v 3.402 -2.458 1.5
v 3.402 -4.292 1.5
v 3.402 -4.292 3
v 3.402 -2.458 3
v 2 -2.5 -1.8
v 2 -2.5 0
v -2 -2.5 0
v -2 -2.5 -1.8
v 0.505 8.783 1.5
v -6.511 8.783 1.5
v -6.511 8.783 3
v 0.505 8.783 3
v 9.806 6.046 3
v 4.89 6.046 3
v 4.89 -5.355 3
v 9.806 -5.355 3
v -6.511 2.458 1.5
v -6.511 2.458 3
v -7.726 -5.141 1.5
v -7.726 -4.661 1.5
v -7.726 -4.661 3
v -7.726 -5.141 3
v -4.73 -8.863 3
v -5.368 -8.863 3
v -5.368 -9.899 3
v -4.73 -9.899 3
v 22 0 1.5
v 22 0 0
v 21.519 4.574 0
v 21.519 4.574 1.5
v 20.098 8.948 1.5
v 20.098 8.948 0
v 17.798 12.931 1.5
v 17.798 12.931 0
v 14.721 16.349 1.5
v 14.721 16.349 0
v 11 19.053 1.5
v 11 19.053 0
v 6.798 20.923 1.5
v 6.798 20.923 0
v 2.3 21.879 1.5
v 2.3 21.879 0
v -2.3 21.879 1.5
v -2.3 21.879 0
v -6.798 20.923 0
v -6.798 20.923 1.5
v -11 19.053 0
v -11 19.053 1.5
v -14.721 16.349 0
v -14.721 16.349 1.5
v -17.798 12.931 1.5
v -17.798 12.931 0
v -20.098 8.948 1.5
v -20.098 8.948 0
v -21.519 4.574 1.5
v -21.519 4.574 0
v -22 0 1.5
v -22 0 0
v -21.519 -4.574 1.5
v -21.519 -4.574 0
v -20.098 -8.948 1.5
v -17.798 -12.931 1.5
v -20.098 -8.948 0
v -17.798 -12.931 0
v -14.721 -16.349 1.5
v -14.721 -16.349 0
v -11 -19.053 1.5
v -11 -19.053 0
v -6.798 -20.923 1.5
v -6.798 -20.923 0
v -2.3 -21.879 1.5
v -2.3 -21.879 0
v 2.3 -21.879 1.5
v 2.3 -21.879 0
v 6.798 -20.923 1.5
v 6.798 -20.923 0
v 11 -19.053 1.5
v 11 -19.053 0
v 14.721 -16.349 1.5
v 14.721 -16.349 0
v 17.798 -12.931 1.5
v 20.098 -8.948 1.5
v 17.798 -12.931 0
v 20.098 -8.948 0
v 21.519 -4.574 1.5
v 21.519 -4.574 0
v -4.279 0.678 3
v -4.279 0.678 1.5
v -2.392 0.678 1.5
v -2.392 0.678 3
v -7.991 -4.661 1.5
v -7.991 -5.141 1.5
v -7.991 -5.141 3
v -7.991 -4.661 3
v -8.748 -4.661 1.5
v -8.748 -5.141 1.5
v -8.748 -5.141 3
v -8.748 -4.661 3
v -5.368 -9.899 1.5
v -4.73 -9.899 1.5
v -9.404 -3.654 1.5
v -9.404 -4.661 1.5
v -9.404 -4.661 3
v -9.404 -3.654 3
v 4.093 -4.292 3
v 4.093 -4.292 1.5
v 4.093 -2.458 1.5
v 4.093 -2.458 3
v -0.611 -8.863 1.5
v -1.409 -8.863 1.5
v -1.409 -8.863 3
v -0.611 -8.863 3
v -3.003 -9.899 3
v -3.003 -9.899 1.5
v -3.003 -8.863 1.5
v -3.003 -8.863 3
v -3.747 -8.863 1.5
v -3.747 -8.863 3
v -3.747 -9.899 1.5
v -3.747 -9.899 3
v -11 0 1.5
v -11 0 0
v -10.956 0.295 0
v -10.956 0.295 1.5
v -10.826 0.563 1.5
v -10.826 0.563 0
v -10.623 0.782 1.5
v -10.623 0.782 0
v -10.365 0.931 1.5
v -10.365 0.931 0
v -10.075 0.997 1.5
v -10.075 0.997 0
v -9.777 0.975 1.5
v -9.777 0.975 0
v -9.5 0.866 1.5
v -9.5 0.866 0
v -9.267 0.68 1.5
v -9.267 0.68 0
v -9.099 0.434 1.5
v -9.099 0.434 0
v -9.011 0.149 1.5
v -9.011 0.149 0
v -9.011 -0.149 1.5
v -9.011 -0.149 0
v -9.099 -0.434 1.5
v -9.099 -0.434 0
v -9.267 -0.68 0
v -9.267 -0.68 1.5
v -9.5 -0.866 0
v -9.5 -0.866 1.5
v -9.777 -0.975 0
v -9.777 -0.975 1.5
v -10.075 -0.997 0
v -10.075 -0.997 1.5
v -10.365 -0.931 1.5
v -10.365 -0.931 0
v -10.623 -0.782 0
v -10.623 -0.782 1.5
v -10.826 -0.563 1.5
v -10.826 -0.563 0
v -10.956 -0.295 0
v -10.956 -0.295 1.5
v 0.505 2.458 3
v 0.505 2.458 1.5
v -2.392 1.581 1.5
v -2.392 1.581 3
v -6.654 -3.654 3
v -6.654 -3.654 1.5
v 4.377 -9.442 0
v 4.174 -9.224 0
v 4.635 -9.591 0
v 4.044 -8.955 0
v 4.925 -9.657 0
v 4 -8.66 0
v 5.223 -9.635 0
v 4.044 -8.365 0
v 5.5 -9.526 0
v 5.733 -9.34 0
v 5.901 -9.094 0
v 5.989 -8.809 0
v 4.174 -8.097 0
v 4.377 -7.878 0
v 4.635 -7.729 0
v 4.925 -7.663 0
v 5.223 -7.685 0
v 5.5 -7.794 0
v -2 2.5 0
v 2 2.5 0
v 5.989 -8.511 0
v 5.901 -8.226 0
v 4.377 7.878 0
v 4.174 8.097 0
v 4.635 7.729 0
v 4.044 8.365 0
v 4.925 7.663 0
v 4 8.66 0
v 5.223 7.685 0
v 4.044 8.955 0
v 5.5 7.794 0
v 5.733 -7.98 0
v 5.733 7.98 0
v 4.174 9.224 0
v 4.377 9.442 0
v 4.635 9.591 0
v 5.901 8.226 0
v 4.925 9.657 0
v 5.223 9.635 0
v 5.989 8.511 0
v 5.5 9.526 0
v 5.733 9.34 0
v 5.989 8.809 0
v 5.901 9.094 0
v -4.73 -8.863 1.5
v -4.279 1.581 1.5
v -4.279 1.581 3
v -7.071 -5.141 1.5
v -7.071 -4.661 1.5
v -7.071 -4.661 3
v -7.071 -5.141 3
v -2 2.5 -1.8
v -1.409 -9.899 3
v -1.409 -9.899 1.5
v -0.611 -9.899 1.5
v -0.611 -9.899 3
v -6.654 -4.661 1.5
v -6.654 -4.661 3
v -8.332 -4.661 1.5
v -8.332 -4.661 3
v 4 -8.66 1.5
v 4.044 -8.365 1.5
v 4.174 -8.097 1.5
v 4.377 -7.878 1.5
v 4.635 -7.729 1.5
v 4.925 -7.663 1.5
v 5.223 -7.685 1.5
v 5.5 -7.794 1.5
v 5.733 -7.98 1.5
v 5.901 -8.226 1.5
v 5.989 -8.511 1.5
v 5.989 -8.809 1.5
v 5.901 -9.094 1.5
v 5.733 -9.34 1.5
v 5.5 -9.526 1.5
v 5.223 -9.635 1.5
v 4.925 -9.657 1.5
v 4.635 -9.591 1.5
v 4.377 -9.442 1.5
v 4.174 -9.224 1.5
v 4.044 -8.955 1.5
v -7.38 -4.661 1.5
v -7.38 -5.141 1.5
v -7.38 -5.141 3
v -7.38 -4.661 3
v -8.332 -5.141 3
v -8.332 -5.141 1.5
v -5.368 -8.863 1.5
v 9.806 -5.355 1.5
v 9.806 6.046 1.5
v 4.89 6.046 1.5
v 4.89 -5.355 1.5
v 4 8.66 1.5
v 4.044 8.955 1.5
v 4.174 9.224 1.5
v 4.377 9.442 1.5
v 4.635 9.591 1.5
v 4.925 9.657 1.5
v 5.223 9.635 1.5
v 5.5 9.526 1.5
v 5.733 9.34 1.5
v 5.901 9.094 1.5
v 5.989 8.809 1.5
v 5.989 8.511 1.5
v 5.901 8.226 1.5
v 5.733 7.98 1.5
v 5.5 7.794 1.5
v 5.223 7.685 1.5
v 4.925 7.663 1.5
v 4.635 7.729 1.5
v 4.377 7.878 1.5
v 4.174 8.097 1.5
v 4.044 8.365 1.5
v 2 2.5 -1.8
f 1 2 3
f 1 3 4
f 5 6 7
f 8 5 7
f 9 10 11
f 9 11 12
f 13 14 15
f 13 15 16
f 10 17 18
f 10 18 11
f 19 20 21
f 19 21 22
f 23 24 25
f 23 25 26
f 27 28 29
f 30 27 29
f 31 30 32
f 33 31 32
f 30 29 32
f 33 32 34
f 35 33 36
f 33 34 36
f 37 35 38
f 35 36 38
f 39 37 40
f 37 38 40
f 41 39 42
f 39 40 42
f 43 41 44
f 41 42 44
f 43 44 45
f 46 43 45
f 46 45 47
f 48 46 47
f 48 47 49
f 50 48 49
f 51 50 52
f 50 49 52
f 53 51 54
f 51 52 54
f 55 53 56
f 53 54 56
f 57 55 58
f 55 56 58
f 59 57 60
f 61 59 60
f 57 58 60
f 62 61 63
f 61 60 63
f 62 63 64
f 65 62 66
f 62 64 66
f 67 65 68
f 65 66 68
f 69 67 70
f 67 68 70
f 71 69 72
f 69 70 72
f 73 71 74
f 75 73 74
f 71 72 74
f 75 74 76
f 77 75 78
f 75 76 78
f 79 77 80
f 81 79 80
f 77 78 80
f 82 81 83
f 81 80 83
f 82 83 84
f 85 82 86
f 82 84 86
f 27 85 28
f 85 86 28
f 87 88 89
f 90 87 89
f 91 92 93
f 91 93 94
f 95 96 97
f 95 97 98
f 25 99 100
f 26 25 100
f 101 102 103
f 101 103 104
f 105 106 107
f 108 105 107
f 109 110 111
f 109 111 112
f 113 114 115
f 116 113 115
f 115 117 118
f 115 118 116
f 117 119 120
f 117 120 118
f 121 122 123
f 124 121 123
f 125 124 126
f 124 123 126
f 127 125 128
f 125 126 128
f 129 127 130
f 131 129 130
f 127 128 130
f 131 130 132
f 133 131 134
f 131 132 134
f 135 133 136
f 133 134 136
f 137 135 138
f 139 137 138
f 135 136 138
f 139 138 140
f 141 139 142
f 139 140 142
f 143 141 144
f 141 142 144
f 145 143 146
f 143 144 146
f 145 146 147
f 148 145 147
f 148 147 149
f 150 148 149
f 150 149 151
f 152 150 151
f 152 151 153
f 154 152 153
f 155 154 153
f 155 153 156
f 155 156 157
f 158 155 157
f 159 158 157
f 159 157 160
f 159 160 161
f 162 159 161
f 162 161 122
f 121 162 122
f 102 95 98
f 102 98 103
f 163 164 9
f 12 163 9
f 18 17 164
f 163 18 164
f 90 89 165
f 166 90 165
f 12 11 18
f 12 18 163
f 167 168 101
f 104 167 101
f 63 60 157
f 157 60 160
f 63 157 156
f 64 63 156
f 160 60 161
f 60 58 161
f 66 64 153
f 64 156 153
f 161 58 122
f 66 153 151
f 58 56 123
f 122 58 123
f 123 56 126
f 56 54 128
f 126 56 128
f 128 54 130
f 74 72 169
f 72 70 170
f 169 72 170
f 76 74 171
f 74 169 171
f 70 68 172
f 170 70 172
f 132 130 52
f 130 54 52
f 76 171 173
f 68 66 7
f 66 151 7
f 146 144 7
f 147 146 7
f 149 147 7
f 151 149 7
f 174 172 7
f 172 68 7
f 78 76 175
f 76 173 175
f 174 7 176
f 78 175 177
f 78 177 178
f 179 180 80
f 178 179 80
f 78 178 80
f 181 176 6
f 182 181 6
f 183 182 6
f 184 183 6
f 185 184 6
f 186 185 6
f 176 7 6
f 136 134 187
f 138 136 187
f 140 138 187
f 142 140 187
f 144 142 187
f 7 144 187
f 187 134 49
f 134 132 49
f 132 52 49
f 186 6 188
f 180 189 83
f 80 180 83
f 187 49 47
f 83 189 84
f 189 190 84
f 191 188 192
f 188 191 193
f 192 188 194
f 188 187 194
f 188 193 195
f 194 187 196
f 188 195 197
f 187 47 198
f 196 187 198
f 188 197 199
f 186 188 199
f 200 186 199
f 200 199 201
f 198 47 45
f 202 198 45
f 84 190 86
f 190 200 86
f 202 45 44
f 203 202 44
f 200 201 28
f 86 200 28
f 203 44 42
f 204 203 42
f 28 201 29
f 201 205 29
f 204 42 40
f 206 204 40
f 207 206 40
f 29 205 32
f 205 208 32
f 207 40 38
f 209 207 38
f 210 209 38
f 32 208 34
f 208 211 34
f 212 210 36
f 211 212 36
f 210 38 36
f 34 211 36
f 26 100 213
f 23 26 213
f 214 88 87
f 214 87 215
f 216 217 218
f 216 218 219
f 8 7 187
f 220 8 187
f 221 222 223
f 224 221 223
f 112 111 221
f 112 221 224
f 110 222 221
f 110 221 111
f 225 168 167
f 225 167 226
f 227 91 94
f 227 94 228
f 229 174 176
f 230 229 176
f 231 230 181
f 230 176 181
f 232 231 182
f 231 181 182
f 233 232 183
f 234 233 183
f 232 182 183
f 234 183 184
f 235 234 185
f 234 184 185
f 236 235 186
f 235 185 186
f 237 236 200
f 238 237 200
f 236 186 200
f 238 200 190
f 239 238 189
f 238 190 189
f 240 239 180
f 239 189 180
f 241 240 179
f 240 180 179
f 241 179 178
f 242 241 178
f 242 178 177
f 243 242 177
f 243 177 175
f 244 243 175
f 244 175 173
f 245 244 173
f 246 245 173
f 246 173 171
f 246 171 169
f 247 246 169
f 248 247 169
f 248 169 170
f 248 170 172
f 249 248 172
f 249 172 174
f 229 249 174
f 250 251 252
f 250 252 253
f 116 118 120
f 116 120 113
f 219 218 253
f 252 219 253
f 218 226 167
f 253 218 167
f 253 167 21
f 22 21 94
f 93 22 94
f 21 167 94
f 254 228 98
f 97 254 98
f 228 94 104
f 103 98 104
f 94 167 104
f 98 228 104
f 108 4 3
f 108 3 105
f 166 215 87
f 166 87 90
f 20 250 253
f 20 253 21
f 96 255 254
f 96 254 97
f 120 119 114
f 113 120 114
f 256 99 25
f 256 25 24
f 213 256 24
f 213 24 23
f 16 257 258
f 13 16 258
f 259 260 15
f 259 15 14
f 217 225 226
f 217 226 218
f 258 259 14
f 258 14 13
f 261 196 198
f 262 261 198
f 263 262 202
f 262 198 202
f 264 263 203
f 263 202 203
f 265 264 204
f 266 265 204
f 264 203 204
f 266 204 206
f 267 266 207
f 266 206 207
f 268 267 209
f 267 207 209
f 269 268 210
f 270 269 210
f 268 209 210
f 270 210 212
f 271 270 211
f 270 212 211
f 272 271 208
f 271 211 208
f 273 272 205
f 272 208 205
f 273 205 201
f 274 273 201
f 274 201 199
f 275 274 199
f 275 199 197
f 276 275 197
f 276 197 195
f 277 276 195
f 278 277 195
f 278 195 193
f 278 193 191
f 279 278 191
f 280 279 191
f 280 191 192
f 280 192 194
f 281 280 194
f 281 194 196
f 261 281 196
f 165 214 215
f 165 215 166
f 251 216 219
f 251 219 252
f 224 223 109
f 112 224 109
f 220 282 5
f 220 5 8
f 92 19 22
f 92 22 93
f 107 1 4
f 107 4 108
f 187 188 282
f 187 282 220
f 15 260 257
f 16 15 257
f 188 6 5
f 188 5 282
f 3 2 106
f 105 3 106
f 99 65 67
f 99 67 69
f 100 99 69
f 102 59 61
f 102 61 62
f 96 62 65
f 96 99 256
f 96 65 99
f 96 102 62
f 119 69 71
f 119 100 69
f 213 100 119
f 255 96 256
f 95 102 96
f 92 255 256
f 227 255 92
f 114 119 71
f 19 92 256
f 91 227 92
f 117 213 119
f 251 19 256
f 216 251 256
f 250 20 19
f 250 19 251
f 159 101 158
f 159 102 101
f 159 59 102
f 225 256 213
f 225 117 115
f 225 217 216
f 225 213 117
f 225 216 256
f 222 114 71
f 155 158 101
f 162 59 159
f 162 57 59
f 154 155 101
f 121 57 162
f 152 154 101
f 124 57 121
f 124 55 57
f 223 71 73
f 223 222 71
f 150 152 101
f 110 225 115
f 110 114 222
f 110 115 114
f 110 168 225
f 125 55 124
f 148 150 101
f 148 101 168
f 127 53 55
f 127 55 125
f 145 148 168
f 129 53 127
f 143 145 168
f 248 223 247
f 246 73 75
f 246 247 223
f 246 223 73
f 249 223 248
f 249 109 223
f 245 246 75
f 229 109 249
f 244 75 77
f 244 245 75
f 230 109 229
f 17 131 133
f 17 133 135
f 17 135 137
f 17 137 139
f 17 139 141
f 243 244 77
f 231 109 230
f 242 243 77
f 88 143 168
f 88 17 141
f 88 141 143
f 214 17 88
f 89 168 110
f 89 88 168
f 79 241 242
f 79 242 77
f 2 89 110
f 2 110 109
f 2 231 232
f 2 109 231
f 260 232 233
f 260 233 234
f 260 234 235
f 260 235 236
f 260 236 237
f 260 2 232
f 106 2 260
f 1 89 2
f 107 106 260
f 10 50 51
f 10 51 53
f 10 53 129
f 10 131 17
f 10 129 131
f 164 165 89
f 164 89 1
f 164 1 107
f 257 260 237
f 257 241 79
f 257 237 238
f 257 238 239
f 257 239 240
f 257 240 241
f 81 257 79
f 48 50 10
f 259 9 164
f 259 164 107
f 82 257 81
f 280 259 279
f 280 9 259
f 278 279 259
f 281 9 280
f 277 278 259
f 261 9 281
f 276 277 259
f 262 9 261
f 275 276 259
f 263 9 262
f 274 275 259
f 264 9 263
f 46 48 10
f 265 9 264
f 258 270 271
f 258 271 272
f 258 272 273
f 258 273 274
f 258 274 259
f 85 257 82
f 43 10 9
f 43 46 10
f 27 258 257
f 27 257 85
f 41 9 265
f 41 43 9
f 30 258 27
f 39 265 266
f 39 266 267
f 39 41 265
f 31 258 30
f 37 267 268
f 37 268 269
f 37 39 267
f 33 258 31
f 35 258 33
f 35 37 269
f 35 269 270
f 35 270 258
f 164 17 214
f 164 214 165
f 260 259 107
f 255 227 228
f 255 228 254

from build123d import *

# Parameters (mm, degrees)
SKETCH_1_R          = 22
EXTRUDE_1_DEPTH     = 1.5
SKETCH_2_W          = 4
SKETCH_2_H          = 5
EXTRUDE_2_DEPTH     = 1.8
SKETCH_3_R          = 1
CUT_EXTRUDE_1_DEPTH = 1.8
SKETCH_4_W          = 7.015976939
SKETCH_4_H          = 6.325009514
SKETCH_4_W_2        = 4.916498991
SKETCH_4_H_2        = 11.400962527
SKETCH_4_W_3        = 1.886872586
SKETCH_4_H_3        = 0.903572787
SKETCH_4_W_4        = 0.637816086
SKETCH_4_H_4        = 1.036451139
SKETCH_4_W_5        = 0.744118766
SKETCH_4_W_6        = 0.797270107
SKETCH_4_W_7        = 0.690967426
SKETCH_4_H_5        = 1.833721246
EXTRUDE_3_DEPTH     = 1.5


with BuildPart() as part:
    # 草图1 → 凸台-拉伸1 (new body)
    with BuildSketch(Plane.XY):
        Circle(SKETCH_1_R)
    extrude(amount=EXTRUDE_1_DEPTH)

    # 草图2 → 凸台-拉伸2 (add)
    with BuildSketch(Plane(origin=(0, 0, 0), x_dir=(-1, 0, 0), z_dir=(0, 0, -1))):
        Rectangle(SKETCH_2_W, SKETCH_2_H)
    extrude(amount=EXTRUDE_2_DEPTH)

    # 草图3 → 切除-拉伸1 (cut)
    with BuildSketch(Plane(origin=(0, 0, 0), x_dir=(-1, 0, 0), z_dir=(0, 0, -1))):
        with Locations((10, 0)):
            Circle(SKETCH_3_R)
        with Locations((-5, 8.660254038)):
            Circle(SKETCH_3_R)
        with Locations((-5, -8.660254038)):
            Circle(SKETCH_3_R)
    extrude(amount=-CUT_EXTRUDE_1_DEPTH, mode=Mode.SUBTRACT)

    # 草图4 → 凸台-拉伸3 (add)
    with BuildSketch(Plane.XY.offset(1.5)):
        Polygon((-8.105579419, -3.654154656), (-6.654300112, -3.654154656), (-6.654300112, -4.661389837), (-7.070508219, -4.661389837), (-7.070508219, -5.140659778), (-7.379939766, -5.140659778), (-7.379939766, -4.661389837), (-7.726351297, -4.661389837), (-7.726351297, -5.140659778), (-7.991211002, -5.140659778), (-7.991211002, -4.661389837), (-8.331744908, -4.661389837), (-8.331744908, -5.140659778), (-8.747953015, -5.140659778), (-8.747953015, -4.661389837), (-9.403796093, -4.661389837), (-9.403796093, -3.654154656), align=None)
        with Locations((-3.003050736, 5.620754253)):
            Rectangle(SKETCH_4_W, SKETCH_4_H)
        with Locations((7.348172818, 0.345483713)):
            Rectangle(SKETCH_4_W_2, SKETCH_4_H_2)
        with Locations((-3.335246613, 1.129465985)):
            Rectangle(SKETCH_4_W_3, SKETCH_4_H_3)
        with Locations((-5.049377343, -9.38121159)):
            Rectangle(SKETCH_4_W_4, SKETCH_4_H_4)
        with Locations((-3.375110119, -9.38121159)):
            Rectangle(SKETCH_4_W_5, SKETCH_4_H_4)
        with Locations((-1.009875468, -9.38121159)):
            Rectangle(SKETCH_4_W_6, SKETCH_4_H_4)
        with Locations((3.747169502, -3.375110119)):
            Rectangle(SKETCH_4_W_7, SKETCH_4_H_5)
    extrude(amount=EXTRUDE_3_DEPTH)


solid = part.part
